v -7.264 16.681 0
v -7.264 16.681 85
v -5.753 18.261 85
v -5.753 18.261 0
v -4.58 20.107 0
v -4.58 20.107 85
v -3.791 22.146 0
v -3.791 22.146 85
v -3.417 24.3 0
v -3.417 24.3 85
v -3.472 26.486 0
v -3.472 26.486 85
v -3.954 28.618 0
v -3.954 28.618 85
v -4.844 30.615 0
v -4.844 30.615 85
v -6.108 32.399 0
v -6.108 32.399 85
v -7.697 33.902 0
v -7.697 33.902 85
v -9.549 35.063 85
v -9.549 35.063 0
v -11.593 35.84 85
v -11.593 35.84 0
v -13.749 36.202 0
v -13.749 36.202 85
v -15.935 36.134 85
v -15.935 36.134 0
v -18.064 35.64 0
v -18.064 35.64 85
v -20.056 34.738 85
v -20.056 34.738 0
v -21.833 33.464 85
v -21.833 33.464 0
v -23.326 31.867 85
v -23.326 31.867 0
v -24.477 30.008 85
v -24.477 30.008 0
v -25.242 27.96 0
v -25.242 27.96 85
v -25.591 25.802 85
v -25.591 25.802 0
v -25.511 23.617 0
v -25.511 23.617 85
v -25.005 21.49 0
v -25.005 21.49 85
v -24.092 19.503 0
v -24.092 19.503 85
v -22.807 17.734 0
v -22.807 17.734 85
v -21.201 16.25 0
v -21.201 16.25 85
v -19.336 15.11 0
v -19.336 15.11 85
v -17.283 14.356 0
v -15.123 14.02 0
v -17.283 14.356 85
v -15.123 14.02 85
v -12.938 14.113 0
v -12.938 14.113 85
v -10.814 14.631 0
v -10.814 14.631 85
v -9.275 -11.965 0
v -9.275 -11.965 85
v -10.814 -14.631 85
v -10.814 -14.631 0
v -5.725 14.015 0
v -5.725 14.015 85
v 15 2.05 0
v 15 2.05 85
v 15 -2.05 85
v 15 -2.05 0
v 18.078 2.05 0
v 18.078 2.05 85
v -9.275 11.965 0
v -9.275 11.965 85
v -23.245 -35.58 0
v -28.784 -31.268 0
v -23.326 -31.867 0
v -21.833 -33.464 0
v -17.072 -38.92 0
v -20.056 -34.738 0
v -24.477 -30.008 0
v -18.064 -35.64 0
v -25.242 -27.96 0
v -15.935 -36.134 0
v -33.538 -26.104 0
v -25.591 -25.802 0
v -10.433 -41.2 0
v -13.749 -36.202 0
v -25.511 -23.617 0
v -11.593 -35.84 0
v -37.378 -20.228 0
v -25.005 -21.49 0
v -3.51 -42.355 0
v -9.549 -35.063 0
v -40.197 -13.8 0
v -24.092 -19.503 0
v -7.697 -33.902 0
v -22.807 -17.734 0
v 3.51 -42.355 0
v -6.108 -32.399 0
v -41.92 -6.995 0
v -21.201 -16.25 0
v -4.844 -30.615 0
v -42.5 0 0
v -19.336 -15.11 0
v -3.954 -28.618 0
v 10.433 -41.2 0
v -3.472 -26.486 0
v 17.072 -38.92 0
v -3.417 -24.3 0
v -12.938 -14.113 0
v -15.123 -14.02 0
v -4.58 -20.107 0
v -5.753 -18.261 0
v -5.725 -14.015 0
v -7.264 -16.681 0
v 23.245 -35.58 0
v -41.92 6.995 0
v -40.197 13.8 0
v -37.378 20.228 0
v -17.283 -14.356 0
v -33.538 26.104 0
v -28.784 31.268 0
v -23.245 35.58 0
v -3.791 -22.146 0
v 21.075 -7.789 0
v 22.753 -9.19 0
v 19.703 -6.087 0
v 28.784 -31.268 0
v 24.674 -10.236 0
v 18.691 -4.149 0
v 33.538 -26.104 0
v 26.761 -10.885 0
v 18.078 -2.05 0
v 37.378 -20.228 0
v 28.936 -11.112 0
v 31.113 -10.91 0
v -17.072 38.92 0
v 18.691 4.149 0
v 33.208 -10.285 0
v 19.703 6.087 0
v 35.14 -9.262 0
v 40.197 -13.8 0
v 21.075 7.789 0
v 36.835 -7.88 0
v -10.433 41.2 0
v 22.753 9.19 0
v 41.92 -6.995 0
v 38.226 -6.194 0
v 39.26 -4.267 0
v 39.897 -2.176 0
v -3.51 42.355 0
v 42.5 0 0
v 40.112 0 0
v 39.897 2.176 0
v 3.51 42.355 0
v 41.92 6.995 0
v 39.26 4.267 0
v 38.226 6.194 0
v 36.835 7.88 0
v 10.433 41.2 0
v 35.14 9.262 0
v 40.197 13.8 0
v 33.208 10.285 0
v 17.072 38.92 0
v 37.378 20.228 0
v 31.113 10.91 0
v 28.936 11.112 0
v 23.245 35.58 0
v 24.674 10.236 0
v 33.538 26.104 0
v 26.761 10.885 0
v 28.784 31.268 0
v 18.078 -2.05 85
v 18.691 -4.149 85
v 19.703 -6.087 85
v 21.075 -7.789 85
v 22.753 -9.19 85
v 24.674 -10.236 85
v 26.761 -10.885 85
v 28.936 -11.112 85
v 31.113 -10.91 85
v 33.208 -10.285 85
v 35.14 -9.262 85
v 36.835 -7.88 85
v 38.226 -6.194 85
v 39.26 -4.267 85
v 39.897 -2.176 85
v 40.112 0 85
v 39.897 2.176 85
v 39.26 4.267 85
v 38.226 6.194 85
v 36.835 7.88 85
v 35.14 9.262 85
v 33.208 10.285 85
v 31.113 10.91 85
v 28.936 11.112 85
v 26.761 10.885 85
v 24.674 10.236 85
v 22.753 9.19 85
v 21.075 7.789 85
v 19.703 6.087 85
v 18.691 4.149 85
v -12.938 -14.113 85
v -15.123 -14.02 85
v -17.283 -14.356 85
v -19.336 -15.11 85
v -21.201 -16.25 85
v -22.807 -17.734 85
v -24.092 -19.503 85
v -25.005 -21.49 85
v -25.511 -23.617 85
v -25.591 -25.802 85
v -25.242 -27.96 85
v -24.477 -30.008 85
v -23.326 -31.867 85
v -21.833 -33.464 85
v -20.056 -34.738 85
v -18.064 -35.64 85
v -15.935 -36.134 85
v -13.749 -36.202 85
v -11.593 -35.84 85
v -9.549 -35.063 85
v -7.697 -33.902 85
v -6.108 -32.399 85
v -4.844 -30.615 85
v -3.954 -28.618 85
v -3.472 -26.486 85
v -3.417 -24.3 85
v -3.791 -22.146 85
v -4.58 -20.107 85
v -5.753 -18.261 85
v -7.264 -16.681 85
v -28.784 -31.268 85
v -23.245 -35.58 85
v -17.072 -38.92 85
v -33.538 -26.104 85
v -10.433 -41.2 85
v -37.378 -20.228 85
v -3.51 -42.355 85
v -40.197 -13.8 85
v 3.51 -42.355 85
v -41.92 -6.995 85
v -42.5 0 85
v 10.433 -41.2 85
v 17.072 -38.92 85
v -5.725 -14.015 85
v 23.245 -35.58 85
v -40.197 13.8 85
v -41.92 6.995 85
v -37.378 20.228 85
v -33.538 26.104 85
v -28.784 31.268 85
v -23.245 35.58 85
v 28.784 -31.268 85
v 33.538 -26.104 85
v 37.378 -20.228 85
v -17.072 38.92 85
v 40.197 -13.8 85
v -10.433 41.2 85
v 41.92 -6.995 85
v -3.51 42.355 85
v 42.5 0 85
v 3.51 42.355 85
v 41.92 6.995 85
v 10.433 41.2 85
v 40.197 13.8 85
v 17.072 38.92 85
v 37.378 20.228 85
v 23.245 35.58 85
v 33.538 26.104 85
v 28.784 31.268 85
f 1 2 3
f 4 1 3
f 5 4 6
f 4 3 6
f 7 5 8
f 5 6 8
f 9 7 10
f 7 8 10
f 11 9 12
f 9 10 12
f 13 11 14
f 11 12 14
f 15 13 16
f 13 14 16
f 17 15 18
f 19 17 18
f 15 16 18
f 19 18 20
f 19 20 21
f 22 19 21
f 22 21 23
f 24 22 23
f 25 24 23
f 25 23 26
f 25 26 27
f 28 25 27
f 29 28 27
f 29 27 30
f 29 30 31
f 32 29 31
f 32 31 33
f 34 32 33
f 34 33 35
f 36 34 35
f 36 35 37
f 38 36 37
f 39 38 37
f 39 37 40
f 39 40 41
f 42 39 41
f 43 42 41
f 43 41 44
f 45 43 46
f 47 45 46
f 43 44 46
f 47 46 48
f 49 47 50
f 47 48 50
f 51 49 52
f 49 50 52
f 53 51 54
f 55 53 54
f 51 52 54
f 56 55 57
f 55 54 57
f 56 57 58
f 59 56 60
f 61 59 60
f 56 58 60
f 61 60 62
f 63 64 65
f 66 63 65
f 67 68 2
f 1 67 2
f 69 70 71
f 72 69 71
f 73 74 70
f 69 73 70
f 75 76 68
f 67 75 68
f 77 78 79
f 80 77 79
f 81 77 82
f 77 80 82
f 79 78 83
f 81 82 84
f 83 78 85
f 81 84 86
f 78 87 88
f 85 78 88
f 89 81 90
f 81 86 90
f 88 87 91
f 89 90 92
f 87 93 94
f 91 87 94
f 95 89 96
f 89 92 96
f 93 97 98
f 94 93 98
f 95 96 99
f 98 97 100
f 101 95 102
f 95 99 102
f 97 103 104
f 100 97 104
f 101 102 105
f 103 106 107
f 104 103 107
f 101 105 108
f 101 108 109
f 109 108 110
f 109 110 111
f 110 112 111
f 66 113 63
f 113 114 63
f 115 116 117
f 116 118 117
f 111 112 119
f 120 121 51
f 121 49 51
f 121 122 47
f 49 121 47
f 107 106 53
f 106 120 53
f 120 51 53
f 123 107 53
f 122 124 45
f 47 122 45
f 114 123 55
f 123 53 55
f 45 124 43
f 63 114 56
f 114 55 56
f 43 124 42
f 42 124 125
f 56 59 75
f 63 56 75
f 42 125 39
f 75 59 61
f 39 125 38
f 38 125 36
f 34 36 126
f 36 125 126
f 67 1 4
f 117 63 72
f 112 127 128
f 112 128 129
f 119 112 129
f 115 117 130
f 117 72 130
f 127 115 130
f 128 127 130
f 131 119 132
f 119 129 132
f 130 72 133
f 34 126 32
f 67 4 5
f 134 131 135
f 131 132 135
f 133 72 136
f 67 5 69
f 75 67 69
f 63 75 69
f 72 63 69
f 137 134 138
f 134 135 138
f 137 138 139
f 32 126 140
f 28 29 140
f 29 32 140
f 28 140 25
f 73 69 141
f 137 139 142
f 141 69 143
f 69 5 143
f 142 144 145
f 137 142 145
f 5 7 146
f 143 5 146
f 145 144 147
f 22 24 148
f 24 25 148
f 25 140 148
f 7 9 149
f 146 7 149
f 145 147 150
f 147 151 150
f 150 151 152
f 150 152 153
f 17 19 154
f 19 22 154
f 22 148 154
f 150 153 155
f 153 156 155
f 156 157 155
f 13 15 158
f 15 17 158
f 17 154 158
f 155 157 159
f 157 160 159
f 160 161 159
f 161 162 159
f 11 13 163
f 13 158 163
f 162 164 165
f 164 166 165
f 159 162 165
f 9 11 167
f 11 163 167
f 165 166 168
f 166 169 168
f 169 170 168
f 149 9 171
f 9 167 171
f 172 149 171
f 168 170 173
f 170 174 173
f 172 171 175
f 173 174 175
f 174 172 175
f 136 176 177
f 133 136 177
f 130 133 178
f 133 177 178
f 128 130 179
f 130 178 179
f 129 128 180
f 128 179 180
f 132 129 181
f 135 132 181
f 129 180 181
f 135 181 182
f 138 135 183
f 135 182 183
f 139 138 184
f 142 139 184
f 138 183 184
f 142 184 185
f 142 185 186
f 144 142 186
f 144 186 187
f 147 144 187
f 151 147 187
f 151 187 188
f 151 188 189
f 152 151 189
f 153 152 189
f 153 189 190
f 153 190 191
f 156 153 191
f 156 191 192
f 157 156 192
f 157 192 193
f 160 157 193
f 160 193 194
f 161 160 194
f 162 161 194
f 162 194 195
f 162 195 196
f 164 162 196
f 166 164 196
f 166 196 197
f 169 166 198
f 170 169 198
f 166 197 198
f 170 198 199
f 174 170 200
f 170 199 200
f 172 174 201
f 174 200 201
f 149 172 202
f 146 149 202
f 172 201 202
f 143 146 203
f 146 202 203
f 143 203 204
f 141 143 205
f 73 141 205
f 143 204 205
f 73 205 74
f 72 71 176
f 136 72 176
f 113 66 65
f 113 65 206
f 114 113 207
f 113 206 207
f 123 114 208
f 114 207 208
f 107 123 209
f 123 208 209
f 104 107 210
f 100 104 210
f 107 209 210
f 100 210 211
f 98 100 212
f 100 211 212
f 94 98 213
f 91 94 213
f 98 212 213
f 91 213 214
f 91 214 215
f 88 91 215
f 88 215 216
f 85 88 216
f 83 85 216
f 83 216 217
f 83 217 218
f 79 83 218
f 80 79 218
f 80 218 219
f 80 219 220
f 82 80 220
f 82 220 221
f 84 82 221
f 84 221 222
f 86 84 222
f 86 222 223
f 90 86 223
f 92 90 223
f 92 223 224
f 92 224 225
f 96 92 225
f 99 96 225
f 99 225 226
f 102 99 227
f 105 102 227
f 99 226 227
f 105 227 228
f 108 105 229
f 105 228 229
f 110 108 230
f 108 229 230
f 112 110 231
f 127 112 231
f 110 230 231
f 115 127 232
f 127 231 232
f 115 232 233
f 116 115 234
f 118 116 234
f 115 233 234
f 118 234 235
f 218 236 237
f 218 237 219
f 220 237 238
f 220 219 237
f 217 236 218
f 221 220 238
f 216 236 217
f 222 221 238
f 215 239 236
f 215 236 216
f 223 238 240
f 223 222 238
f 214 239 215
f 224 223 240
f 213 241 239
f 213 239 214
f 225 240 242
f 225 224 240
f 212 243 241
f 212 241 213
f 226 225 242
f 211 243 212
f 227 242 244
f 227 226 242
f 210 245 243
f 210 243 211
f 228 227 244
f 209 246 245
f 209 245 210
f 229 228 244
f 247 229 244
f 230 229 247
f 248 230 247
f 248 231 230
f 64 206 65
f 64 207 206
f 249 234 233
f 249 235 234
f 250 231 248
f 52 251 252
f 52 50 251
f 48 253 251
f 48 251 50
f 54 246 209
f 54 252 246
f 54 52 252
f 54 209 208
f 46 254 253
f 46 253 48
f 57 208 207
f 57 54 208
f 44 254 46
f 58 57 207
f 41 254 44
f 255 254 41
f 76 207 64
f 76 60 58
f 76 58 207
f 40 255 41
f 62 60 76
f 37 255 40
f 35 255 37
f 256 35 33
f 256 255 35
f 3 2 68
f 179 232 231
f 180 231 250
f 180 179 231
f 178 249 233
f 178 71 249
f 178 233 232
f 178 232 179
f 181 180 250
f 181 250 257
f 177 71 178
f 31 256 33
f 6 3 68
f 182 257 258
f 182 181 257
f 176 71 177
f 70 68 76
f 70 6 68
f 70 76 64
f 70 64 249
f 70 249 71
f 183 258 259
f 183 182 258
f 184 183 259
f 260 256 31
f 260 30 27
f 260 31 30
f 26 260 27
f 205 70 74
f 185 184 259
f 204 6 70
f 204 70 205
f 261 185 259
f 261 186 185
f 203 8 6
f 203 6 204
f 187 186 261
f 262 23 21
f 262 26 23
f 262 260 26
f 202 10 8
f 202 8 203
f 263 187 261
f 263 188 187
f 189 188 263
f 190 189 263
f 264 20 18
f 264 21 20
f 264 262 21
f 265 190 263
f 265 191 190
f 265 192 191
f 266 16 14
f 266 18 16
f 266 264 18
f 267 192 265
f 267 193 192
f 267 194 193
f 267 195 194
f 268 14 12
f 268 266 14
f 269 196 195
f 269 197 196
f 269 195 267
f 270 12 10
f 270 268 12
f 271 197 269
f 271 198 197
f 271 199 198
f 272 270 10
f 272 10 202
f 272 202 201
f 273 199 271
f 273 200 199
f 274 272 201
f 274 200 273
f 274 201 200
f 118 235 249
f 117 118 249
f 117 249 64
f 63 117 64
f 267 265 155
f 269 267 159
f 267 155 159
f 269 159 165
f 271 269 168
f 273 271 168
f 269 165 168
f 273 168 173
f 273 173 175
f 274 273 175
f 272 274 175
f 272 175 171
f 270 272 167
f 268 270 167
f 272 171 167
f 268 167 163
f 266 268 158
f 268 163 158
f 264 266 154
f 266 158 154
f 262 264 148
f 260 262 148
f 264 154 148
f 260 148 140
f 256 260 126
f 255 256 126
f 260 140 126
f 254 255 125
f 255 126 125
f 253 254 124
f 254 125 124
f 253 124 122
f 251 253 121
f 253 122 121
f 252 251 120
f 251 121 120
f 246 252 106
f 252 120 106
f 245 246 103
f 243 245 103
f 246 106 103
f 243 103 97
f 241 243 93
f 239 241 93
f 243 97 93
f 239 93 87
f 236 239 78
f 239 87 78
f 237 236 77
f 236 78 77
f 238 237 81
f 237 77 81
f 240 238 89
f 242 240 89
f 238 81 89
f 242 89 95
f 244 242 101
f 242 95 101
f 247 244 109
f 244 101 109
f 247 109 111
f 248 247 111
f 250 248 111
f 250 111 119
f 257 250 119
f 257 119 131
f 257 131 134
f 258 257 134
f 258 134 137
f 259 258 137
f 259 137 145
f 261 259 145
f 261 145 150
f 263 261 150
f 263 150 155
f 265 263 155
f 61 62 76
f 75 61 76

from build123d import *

# Parameters (mm, degrees)
F0_R            = 42.5
F1_DEPTH        = 85
F3_DEPTH        = 85.001
F3_COPIES_COUNT = 3


# Not quite as in the source:
# - a pattern or mirror of a feature is missing from the dataset's text; its kind, count and spacing are read off the source's solid


with BuildPart() as f1:
    # F0 (on Top) → F1 (new body)
    with BuildSketch(Plane.XY):
        Circle(F0_R)
    extrude(amount=F1_DEPTH)

    # F2 (on face) → F3 (cut, through all)
    with BuildSketch(Plane.XY.offset(85)):
        with BuildLine():
            Line((15, -2.05), (18.0782255906, -2.05))
            ThreePointArc((18.0782255906, -2.05), (40.1125, 0), (18.0782255906, 2.05))
            Line((18.0782255906, 2.05), (15, 2.05))
            Line((15, 2.05), (15, -2.05))
        make_face()
    f3 = extrude(amount=-F3_DEPTH, mode=Mode.SUBTRACT)

    # F3_copies: F3 ×3 about axis
    f3_copies_axis = Axis((0, 0, 0), (0, 0, 1))
    for i in range(1, F3_COPIES_COUNT):
        add(f3.rotate(f3_copies_axis, i * 360 / F3_COPIES_COUNT), mode=Mode.SUBTRACT)


solid = f1.part
